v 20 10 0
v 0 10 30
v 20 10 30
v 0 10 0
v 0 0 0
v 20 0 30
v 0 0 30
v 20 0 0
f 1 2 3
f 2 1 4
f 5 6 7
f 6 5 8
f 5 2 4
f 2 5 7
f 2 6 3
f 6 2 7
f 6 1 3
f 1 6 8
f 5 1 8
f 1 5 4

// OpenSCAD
%cube([30, 20, 10]);
rotate([-90, 0, 0]) rotate([0, 0, -90]) cube([30, 20, 10]); 
